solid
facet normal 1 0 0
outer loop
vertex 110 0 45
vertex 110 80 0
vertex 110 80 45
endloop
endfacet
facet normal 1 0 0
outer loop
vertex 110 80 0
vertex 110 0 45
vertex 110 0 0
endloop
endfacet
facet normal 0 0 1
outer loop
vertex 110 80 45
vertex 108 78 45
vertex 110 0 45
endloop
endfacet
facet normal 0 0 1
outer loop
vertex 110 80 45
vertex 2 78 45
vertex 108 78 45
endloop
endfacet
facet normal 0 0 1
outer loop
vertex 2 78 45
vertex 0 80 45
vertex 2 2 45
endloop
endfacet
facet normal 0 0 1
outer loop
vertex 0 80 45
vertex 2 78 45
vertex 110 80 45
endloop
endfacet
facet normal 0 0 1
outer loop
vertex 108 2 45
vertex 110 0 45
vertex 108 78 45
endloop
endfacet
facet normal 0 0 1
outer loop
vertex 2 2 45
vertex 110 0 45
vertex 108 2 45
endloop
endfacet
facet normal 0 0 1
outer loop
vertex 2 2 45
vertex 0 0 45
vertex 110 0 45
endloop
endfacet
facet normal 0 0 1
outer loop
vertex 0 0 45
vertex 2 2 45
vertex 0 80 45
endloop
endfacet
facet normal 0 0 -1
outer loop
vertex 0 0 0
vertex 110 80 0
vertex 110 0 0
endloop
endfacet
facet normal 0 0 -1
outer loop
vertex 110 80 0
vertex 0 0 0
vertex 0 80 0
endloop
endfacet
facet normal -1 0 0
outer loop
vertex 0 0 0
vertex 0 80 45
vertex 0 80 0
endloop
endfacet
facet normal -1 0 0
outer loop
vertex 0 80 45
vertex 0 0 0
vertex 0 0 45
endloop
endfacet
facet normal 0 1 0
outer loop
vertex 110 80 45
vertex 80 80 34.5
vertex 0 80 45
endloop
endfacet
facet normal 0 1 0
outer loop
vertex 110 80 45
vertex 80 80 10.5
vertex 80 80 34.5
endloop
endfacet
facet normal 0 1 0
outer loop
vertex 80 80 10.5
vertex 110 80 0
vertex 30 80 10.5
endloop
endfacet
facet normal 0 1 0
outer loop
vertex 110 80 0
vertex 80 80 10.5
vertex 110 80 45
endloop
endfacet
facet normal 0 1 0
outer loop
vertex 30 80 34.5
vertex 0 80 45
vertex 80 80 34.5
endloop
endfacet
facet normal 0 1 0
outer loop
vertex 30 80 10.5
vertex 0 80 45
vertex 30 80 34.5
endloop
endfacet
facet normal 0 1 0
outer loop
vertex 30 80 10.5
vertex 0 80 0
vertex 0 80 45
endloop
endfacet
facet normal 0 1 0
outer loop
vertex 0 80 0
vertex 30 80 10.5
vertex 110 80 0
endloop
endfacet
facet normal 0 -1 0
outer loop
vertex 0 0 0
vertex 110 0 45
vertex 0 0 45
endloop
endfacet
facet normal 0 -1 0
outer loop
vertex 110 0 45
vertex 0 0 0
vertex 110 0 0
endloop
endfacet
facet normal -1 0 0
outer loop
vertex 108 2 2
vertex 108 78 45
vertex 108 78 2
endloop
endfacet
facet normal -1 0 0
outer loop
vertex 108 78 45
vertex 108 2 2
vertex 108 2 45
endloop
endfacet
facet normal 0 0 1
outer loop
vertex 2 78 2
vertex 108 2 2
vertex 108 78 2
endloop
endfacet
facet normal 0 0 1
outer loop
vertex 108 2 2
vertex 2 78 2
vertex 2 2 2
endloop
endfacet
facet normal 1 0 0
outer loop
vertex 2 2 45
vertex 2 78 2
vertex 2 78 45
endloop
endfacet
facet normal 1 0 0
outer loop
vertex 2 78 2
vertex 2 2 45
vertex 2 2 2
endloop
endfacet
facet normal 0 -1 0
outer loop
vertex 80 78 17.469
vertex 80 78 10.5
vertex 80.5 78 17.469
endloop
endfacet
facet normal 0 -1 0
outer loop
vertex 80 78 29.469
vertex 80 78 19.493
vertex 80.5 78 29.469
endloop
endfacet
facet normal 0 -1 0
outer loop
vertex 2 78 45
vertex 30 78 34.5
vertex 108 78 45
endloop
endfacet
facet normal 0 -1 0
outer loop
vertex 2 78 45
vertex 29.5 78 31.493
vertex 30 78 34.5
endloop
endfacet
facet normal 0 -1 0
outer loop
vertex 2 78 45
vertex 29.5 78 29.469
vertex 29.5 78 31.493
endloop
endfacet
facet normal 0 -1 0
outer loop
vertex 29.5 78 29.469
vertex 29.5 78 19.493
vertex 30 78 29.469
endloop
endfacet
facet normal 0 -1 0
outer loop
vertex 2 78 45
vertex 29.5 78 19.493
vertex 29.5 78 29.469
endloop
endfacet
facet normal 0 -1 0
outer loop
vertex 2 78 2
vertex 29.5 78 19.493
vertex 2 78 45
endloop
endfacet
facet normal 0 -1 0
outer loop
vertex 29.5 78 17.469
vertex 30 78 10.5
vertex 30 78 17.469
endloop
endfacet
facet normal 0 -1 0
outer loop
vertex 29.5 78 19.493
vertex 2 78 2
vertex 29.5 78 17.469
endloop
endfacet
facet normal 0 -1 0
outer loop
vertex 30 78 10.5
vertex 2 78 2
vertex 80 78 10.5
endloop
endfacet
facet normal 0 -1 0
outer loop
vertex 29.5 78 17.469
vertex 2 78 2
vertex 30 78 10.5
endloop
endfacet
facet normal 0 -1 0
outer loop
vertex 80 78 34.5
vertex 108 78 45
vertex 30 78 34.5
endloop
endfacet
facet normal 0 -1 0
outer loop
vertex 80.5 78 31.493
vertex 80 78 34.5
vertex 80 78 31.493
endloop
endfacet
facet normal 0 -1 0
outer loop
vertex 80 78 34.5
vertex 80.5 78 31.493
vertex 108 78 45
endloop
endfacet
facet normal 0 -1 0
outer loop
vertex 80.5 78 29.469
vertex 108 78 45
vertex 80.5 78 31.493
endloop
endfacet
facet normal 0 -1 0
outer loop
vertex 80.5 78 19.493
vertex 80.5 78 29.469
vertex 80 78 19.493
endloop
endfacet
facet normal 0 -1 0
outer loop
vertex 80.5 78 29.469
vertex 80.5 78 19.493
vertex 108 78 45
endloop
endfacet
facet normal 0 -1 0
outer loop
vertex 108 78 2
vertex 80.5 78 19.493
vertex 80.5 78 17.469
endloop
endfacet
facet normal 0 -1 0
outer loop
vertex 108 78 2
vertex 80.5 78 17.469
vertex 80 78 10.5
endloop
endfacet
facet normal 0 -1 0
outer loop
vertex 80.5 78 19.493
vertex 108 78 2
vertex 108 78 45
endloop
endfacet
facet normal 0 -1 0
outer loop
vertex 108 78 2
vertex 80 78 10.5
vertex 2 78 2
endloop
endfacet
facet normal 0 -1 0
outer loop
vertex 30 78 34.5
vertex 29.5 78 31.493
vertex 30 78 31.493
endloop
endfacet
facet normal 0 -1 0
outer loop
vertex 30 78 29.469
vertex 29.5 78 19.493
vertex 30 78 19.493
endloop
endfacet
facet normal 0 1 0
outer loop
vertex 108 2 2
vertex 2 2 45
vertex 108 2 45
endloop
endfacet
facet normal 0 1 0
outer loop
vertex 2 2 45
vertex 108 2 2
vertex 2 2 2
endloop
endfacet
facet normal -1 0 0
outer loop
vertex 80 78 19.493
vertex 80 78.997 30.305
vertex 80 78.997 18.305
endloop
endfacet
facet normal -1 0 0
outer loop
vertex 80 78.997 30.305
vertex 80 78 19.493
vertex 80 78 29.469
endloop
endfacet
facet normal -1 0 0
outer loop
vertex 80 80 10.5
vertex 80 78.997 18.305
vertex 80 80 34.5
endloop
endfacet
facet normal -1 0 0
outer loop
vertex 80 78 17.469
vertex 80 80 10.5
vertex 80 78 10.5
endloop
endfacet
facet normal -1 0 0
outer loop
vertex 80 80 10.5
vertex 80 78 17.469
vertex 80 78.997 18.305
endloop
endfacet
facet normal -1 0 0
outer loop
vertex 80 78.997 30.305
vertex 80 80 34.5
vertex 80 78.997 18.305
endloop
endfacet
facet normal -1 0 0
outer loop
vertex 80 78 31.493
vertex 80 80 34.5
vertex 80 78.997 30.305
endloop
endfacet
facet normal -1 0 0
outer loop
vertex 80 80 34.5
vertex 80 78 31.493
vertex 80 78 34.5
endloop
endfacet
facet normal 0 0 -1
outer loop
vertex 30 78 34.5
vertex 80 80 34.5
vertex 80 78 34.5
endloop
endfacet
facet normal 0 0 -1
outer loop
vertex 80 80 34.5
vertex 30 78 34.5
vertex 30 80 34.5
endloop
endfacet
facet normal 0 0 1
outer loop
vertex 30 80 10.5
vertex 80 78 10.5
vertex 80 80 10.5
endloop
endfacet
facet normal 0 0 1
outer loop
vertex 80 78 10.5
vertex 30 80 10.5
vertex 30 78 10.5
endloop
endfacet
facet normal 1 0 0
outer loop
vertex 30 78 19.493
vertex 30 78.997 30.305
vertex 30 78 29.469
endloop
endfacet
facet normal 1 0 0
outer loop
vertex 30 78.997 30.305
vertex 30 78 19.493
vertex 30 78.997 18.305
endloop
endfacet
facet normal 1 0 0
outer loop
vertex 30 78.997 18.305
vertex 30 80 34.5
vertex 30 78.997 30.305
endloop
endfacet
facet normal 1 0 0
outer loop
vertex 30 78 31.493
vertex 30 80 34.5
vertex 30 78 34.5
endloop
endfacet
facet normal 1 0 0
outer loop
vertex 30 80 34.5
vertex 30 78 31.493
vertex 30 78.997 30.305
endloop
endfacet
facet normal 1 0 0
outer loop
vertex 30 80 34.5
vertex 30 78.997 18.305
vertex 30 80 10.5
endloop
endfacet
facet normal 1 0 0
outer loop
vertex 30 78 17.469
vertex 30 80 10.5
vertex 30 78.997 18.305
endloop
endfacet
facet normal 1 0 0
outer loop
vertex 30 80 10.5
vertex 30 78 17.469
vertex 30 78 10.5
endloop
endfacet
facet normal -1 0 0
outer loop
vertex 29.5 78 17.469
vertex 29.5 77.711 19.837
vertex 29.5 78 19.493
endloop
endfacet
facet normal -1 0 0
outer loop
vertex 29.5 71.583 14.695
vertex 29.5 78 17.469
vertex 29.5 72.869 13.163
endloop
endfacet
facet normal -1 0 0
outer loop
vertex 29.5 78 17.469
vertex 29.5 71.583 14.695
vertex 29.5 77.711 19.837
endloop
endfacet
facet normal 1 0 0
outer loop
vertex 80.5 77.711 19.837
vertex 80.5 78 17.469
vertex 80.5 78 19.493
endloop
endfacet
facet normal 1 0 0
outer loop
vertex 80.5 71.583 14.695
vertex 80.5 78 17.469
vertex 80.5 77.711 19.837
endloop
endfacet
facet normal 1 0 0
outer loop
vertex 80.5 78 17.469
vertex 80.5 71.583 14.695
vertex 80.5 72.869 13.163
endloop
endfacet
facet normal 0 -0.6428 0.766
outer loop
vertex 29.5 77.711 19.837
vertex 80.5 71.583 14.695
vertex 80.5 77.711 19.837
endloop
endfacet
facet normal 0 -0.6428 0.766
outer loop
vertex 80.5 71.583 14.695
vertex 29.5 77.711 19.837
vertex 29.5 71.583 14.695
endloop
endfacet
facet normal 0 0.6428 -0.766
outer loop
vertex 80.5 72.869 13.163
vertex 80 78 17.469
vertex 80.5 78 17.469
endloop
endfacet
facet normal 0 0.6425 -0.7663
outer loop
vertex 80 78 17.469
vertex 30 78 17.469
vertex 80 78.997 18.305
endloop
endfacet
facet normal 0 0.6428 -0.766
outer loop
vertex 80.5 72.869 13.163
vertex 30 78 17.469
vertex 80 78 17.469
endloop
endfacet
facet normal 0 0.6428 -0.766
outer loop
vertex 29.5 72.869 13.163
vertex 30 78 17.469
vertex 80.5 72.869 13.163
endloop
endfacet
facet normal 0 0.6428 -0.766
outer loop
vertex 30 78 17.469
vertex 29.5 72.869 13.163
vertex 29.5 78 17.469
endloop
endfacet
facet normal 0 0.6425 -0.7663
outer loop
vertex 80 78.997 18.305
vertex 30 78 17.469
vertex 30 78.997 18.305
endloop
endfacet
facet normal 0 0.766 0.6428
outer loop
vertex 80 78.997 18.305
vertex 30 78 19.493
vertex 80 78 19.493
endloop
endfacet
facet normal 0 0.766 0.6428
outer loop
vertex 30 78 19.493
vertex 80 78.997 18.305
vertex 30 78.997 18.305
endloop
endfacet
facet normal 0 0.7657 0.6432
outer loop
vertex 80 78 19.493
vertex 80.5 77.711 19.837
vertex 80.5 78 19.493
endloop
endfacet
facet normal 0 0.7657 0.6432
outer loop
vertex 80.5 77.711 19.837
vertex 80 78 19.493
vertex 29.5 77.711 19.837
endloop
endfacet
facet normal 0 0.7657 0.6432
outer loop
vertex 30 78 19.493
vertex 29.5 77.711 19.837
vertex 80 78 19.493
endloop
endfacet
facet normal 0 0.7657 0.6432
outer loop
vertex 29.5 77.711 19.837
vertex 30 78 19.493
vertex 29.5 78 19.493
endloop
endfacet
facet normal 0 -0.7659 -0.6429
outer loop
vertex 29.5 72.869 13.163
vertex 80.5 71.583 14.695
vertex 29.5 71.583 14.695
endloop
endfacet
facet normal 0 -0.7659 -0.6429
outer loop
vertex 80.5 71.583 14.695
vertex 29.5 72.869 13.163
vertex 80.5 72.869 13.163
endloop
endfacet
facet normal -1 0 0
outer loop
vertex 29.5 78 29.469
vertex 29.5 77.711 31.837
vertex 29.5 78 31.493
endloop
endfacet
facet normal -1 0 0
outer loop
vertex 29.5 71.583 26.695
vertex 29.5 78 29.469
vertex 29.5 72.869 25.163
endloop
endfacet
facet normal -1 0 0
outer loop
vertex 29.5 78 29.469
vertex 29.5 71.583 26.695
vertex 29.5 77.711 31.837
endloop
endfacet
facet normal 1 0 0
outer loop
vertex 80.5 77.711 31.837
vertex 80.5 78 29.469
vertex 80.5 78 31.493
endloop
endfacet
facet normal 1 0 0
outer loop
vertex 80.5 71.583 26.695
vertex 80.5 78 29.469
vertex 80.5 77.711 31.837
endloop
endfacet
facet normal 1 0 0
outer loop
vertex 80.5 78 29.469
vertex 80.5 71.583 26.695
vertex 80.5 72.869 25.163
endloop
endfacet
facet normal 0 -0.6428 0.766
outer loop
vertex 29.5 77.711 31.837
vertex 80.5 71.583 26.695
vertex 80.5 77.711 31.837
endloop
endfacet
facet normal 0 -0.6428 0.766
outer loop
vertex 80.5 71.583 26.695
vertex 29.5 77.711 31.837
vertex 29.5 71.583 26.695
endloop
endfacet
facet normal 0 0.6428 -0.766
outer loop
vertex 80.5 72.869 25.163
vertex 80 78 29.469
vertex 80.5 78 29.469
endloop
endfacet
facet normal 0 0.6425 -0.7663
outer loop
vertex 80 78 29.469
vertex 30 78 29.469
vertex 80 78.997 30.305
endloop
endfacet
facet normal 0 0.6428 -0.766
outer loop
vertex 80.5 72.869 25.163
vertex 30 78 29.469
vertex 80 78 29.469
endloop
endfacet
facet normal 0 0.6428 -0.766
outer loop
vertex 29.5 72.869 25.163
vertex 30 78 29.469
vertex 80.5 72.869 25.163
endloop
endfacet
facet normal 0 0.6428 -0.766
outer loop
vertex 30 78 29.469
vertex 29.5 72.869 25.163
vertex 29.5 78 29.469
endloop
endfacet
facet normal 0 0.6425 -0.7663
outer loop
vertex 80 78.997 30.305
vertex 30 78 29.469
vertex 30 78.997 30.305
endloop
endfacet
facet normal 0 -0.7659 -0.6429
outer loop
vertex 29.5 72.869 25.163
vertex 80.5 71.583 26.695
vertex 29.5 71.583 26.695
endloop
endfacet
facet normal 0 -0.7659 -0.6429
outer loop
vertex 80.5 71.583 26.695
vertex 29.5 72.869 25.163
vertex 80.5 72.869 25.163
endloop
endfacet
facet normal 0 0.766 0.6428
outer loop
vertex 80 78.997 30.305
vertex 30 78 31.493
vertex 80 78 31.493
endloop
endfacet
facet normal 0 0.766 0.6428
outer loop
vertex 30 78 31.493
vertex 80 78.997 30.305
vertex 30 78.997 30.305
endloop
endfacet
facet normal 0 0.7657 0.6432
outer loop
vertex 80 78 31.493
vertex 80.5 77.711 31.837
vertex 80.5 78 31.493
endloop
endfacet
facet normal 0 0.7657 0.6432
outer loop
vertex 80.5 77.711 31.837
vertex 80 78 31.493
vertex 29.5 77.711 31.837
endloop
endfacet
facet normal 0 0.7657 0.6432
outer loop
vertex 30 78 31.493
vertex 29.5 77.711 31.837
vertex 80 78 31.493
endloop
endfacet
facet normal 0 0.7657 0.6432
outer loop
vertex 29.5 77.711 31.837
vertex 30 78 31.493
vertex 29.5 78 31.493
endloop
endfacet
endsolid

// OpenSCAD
$fn = 32;

// ----------------------------------------------------------------------
// Vent box: louvers enclosure
// ----------------------------------------------------------------------

// --- parameters (mm) ---
box_l = 110;              // box length, X
box_w = 80;               // box width, Y
box_h = 45;               // box height, Z
wall_t = 2;               // shell wall thickness
win_l = 50;               // vent window width, X
win_h = 24;               // vent window height, Z
slat_t = 2;               // louver slat thickness
slat_d = 8;               // louver slat depth
slat_a = 40;              // louver slat angle, degrees
slat_pitch = 12;          // louver pitch
slat_yc = 75.29;          // slat centreline Y

win_z0 = (box_h - win_h) / 2;  // window lower edge Z
n_slats = 2;  // louver count
slat_z0 = win_z0 + (win_h - (n_slats - 1) * slat_pitch) / 2;

difference() {
  union() {
    difference() {
      cube([box_l, box_w, box_h]);
  translate([wall_t, wall_t, wall_t])
    cube([box_l - 2 * wall_t, box_w - 2 * wall_t, box_h]);
  translate([(box_l - win_l) / 2, box_w - wall_t - 1, win_z0])
    cube([win_l, wall_t + 2, win_h]);
    }
    for (i = [0 : n_slats - 1])
      translate([box_l / 2, slat_yc, slat_z0 + i * slat_pitch])
        rotate([slat_a, 0, 0])
          cube([win_l + 1, slat_d, slat_t], center = true);
  }
}
